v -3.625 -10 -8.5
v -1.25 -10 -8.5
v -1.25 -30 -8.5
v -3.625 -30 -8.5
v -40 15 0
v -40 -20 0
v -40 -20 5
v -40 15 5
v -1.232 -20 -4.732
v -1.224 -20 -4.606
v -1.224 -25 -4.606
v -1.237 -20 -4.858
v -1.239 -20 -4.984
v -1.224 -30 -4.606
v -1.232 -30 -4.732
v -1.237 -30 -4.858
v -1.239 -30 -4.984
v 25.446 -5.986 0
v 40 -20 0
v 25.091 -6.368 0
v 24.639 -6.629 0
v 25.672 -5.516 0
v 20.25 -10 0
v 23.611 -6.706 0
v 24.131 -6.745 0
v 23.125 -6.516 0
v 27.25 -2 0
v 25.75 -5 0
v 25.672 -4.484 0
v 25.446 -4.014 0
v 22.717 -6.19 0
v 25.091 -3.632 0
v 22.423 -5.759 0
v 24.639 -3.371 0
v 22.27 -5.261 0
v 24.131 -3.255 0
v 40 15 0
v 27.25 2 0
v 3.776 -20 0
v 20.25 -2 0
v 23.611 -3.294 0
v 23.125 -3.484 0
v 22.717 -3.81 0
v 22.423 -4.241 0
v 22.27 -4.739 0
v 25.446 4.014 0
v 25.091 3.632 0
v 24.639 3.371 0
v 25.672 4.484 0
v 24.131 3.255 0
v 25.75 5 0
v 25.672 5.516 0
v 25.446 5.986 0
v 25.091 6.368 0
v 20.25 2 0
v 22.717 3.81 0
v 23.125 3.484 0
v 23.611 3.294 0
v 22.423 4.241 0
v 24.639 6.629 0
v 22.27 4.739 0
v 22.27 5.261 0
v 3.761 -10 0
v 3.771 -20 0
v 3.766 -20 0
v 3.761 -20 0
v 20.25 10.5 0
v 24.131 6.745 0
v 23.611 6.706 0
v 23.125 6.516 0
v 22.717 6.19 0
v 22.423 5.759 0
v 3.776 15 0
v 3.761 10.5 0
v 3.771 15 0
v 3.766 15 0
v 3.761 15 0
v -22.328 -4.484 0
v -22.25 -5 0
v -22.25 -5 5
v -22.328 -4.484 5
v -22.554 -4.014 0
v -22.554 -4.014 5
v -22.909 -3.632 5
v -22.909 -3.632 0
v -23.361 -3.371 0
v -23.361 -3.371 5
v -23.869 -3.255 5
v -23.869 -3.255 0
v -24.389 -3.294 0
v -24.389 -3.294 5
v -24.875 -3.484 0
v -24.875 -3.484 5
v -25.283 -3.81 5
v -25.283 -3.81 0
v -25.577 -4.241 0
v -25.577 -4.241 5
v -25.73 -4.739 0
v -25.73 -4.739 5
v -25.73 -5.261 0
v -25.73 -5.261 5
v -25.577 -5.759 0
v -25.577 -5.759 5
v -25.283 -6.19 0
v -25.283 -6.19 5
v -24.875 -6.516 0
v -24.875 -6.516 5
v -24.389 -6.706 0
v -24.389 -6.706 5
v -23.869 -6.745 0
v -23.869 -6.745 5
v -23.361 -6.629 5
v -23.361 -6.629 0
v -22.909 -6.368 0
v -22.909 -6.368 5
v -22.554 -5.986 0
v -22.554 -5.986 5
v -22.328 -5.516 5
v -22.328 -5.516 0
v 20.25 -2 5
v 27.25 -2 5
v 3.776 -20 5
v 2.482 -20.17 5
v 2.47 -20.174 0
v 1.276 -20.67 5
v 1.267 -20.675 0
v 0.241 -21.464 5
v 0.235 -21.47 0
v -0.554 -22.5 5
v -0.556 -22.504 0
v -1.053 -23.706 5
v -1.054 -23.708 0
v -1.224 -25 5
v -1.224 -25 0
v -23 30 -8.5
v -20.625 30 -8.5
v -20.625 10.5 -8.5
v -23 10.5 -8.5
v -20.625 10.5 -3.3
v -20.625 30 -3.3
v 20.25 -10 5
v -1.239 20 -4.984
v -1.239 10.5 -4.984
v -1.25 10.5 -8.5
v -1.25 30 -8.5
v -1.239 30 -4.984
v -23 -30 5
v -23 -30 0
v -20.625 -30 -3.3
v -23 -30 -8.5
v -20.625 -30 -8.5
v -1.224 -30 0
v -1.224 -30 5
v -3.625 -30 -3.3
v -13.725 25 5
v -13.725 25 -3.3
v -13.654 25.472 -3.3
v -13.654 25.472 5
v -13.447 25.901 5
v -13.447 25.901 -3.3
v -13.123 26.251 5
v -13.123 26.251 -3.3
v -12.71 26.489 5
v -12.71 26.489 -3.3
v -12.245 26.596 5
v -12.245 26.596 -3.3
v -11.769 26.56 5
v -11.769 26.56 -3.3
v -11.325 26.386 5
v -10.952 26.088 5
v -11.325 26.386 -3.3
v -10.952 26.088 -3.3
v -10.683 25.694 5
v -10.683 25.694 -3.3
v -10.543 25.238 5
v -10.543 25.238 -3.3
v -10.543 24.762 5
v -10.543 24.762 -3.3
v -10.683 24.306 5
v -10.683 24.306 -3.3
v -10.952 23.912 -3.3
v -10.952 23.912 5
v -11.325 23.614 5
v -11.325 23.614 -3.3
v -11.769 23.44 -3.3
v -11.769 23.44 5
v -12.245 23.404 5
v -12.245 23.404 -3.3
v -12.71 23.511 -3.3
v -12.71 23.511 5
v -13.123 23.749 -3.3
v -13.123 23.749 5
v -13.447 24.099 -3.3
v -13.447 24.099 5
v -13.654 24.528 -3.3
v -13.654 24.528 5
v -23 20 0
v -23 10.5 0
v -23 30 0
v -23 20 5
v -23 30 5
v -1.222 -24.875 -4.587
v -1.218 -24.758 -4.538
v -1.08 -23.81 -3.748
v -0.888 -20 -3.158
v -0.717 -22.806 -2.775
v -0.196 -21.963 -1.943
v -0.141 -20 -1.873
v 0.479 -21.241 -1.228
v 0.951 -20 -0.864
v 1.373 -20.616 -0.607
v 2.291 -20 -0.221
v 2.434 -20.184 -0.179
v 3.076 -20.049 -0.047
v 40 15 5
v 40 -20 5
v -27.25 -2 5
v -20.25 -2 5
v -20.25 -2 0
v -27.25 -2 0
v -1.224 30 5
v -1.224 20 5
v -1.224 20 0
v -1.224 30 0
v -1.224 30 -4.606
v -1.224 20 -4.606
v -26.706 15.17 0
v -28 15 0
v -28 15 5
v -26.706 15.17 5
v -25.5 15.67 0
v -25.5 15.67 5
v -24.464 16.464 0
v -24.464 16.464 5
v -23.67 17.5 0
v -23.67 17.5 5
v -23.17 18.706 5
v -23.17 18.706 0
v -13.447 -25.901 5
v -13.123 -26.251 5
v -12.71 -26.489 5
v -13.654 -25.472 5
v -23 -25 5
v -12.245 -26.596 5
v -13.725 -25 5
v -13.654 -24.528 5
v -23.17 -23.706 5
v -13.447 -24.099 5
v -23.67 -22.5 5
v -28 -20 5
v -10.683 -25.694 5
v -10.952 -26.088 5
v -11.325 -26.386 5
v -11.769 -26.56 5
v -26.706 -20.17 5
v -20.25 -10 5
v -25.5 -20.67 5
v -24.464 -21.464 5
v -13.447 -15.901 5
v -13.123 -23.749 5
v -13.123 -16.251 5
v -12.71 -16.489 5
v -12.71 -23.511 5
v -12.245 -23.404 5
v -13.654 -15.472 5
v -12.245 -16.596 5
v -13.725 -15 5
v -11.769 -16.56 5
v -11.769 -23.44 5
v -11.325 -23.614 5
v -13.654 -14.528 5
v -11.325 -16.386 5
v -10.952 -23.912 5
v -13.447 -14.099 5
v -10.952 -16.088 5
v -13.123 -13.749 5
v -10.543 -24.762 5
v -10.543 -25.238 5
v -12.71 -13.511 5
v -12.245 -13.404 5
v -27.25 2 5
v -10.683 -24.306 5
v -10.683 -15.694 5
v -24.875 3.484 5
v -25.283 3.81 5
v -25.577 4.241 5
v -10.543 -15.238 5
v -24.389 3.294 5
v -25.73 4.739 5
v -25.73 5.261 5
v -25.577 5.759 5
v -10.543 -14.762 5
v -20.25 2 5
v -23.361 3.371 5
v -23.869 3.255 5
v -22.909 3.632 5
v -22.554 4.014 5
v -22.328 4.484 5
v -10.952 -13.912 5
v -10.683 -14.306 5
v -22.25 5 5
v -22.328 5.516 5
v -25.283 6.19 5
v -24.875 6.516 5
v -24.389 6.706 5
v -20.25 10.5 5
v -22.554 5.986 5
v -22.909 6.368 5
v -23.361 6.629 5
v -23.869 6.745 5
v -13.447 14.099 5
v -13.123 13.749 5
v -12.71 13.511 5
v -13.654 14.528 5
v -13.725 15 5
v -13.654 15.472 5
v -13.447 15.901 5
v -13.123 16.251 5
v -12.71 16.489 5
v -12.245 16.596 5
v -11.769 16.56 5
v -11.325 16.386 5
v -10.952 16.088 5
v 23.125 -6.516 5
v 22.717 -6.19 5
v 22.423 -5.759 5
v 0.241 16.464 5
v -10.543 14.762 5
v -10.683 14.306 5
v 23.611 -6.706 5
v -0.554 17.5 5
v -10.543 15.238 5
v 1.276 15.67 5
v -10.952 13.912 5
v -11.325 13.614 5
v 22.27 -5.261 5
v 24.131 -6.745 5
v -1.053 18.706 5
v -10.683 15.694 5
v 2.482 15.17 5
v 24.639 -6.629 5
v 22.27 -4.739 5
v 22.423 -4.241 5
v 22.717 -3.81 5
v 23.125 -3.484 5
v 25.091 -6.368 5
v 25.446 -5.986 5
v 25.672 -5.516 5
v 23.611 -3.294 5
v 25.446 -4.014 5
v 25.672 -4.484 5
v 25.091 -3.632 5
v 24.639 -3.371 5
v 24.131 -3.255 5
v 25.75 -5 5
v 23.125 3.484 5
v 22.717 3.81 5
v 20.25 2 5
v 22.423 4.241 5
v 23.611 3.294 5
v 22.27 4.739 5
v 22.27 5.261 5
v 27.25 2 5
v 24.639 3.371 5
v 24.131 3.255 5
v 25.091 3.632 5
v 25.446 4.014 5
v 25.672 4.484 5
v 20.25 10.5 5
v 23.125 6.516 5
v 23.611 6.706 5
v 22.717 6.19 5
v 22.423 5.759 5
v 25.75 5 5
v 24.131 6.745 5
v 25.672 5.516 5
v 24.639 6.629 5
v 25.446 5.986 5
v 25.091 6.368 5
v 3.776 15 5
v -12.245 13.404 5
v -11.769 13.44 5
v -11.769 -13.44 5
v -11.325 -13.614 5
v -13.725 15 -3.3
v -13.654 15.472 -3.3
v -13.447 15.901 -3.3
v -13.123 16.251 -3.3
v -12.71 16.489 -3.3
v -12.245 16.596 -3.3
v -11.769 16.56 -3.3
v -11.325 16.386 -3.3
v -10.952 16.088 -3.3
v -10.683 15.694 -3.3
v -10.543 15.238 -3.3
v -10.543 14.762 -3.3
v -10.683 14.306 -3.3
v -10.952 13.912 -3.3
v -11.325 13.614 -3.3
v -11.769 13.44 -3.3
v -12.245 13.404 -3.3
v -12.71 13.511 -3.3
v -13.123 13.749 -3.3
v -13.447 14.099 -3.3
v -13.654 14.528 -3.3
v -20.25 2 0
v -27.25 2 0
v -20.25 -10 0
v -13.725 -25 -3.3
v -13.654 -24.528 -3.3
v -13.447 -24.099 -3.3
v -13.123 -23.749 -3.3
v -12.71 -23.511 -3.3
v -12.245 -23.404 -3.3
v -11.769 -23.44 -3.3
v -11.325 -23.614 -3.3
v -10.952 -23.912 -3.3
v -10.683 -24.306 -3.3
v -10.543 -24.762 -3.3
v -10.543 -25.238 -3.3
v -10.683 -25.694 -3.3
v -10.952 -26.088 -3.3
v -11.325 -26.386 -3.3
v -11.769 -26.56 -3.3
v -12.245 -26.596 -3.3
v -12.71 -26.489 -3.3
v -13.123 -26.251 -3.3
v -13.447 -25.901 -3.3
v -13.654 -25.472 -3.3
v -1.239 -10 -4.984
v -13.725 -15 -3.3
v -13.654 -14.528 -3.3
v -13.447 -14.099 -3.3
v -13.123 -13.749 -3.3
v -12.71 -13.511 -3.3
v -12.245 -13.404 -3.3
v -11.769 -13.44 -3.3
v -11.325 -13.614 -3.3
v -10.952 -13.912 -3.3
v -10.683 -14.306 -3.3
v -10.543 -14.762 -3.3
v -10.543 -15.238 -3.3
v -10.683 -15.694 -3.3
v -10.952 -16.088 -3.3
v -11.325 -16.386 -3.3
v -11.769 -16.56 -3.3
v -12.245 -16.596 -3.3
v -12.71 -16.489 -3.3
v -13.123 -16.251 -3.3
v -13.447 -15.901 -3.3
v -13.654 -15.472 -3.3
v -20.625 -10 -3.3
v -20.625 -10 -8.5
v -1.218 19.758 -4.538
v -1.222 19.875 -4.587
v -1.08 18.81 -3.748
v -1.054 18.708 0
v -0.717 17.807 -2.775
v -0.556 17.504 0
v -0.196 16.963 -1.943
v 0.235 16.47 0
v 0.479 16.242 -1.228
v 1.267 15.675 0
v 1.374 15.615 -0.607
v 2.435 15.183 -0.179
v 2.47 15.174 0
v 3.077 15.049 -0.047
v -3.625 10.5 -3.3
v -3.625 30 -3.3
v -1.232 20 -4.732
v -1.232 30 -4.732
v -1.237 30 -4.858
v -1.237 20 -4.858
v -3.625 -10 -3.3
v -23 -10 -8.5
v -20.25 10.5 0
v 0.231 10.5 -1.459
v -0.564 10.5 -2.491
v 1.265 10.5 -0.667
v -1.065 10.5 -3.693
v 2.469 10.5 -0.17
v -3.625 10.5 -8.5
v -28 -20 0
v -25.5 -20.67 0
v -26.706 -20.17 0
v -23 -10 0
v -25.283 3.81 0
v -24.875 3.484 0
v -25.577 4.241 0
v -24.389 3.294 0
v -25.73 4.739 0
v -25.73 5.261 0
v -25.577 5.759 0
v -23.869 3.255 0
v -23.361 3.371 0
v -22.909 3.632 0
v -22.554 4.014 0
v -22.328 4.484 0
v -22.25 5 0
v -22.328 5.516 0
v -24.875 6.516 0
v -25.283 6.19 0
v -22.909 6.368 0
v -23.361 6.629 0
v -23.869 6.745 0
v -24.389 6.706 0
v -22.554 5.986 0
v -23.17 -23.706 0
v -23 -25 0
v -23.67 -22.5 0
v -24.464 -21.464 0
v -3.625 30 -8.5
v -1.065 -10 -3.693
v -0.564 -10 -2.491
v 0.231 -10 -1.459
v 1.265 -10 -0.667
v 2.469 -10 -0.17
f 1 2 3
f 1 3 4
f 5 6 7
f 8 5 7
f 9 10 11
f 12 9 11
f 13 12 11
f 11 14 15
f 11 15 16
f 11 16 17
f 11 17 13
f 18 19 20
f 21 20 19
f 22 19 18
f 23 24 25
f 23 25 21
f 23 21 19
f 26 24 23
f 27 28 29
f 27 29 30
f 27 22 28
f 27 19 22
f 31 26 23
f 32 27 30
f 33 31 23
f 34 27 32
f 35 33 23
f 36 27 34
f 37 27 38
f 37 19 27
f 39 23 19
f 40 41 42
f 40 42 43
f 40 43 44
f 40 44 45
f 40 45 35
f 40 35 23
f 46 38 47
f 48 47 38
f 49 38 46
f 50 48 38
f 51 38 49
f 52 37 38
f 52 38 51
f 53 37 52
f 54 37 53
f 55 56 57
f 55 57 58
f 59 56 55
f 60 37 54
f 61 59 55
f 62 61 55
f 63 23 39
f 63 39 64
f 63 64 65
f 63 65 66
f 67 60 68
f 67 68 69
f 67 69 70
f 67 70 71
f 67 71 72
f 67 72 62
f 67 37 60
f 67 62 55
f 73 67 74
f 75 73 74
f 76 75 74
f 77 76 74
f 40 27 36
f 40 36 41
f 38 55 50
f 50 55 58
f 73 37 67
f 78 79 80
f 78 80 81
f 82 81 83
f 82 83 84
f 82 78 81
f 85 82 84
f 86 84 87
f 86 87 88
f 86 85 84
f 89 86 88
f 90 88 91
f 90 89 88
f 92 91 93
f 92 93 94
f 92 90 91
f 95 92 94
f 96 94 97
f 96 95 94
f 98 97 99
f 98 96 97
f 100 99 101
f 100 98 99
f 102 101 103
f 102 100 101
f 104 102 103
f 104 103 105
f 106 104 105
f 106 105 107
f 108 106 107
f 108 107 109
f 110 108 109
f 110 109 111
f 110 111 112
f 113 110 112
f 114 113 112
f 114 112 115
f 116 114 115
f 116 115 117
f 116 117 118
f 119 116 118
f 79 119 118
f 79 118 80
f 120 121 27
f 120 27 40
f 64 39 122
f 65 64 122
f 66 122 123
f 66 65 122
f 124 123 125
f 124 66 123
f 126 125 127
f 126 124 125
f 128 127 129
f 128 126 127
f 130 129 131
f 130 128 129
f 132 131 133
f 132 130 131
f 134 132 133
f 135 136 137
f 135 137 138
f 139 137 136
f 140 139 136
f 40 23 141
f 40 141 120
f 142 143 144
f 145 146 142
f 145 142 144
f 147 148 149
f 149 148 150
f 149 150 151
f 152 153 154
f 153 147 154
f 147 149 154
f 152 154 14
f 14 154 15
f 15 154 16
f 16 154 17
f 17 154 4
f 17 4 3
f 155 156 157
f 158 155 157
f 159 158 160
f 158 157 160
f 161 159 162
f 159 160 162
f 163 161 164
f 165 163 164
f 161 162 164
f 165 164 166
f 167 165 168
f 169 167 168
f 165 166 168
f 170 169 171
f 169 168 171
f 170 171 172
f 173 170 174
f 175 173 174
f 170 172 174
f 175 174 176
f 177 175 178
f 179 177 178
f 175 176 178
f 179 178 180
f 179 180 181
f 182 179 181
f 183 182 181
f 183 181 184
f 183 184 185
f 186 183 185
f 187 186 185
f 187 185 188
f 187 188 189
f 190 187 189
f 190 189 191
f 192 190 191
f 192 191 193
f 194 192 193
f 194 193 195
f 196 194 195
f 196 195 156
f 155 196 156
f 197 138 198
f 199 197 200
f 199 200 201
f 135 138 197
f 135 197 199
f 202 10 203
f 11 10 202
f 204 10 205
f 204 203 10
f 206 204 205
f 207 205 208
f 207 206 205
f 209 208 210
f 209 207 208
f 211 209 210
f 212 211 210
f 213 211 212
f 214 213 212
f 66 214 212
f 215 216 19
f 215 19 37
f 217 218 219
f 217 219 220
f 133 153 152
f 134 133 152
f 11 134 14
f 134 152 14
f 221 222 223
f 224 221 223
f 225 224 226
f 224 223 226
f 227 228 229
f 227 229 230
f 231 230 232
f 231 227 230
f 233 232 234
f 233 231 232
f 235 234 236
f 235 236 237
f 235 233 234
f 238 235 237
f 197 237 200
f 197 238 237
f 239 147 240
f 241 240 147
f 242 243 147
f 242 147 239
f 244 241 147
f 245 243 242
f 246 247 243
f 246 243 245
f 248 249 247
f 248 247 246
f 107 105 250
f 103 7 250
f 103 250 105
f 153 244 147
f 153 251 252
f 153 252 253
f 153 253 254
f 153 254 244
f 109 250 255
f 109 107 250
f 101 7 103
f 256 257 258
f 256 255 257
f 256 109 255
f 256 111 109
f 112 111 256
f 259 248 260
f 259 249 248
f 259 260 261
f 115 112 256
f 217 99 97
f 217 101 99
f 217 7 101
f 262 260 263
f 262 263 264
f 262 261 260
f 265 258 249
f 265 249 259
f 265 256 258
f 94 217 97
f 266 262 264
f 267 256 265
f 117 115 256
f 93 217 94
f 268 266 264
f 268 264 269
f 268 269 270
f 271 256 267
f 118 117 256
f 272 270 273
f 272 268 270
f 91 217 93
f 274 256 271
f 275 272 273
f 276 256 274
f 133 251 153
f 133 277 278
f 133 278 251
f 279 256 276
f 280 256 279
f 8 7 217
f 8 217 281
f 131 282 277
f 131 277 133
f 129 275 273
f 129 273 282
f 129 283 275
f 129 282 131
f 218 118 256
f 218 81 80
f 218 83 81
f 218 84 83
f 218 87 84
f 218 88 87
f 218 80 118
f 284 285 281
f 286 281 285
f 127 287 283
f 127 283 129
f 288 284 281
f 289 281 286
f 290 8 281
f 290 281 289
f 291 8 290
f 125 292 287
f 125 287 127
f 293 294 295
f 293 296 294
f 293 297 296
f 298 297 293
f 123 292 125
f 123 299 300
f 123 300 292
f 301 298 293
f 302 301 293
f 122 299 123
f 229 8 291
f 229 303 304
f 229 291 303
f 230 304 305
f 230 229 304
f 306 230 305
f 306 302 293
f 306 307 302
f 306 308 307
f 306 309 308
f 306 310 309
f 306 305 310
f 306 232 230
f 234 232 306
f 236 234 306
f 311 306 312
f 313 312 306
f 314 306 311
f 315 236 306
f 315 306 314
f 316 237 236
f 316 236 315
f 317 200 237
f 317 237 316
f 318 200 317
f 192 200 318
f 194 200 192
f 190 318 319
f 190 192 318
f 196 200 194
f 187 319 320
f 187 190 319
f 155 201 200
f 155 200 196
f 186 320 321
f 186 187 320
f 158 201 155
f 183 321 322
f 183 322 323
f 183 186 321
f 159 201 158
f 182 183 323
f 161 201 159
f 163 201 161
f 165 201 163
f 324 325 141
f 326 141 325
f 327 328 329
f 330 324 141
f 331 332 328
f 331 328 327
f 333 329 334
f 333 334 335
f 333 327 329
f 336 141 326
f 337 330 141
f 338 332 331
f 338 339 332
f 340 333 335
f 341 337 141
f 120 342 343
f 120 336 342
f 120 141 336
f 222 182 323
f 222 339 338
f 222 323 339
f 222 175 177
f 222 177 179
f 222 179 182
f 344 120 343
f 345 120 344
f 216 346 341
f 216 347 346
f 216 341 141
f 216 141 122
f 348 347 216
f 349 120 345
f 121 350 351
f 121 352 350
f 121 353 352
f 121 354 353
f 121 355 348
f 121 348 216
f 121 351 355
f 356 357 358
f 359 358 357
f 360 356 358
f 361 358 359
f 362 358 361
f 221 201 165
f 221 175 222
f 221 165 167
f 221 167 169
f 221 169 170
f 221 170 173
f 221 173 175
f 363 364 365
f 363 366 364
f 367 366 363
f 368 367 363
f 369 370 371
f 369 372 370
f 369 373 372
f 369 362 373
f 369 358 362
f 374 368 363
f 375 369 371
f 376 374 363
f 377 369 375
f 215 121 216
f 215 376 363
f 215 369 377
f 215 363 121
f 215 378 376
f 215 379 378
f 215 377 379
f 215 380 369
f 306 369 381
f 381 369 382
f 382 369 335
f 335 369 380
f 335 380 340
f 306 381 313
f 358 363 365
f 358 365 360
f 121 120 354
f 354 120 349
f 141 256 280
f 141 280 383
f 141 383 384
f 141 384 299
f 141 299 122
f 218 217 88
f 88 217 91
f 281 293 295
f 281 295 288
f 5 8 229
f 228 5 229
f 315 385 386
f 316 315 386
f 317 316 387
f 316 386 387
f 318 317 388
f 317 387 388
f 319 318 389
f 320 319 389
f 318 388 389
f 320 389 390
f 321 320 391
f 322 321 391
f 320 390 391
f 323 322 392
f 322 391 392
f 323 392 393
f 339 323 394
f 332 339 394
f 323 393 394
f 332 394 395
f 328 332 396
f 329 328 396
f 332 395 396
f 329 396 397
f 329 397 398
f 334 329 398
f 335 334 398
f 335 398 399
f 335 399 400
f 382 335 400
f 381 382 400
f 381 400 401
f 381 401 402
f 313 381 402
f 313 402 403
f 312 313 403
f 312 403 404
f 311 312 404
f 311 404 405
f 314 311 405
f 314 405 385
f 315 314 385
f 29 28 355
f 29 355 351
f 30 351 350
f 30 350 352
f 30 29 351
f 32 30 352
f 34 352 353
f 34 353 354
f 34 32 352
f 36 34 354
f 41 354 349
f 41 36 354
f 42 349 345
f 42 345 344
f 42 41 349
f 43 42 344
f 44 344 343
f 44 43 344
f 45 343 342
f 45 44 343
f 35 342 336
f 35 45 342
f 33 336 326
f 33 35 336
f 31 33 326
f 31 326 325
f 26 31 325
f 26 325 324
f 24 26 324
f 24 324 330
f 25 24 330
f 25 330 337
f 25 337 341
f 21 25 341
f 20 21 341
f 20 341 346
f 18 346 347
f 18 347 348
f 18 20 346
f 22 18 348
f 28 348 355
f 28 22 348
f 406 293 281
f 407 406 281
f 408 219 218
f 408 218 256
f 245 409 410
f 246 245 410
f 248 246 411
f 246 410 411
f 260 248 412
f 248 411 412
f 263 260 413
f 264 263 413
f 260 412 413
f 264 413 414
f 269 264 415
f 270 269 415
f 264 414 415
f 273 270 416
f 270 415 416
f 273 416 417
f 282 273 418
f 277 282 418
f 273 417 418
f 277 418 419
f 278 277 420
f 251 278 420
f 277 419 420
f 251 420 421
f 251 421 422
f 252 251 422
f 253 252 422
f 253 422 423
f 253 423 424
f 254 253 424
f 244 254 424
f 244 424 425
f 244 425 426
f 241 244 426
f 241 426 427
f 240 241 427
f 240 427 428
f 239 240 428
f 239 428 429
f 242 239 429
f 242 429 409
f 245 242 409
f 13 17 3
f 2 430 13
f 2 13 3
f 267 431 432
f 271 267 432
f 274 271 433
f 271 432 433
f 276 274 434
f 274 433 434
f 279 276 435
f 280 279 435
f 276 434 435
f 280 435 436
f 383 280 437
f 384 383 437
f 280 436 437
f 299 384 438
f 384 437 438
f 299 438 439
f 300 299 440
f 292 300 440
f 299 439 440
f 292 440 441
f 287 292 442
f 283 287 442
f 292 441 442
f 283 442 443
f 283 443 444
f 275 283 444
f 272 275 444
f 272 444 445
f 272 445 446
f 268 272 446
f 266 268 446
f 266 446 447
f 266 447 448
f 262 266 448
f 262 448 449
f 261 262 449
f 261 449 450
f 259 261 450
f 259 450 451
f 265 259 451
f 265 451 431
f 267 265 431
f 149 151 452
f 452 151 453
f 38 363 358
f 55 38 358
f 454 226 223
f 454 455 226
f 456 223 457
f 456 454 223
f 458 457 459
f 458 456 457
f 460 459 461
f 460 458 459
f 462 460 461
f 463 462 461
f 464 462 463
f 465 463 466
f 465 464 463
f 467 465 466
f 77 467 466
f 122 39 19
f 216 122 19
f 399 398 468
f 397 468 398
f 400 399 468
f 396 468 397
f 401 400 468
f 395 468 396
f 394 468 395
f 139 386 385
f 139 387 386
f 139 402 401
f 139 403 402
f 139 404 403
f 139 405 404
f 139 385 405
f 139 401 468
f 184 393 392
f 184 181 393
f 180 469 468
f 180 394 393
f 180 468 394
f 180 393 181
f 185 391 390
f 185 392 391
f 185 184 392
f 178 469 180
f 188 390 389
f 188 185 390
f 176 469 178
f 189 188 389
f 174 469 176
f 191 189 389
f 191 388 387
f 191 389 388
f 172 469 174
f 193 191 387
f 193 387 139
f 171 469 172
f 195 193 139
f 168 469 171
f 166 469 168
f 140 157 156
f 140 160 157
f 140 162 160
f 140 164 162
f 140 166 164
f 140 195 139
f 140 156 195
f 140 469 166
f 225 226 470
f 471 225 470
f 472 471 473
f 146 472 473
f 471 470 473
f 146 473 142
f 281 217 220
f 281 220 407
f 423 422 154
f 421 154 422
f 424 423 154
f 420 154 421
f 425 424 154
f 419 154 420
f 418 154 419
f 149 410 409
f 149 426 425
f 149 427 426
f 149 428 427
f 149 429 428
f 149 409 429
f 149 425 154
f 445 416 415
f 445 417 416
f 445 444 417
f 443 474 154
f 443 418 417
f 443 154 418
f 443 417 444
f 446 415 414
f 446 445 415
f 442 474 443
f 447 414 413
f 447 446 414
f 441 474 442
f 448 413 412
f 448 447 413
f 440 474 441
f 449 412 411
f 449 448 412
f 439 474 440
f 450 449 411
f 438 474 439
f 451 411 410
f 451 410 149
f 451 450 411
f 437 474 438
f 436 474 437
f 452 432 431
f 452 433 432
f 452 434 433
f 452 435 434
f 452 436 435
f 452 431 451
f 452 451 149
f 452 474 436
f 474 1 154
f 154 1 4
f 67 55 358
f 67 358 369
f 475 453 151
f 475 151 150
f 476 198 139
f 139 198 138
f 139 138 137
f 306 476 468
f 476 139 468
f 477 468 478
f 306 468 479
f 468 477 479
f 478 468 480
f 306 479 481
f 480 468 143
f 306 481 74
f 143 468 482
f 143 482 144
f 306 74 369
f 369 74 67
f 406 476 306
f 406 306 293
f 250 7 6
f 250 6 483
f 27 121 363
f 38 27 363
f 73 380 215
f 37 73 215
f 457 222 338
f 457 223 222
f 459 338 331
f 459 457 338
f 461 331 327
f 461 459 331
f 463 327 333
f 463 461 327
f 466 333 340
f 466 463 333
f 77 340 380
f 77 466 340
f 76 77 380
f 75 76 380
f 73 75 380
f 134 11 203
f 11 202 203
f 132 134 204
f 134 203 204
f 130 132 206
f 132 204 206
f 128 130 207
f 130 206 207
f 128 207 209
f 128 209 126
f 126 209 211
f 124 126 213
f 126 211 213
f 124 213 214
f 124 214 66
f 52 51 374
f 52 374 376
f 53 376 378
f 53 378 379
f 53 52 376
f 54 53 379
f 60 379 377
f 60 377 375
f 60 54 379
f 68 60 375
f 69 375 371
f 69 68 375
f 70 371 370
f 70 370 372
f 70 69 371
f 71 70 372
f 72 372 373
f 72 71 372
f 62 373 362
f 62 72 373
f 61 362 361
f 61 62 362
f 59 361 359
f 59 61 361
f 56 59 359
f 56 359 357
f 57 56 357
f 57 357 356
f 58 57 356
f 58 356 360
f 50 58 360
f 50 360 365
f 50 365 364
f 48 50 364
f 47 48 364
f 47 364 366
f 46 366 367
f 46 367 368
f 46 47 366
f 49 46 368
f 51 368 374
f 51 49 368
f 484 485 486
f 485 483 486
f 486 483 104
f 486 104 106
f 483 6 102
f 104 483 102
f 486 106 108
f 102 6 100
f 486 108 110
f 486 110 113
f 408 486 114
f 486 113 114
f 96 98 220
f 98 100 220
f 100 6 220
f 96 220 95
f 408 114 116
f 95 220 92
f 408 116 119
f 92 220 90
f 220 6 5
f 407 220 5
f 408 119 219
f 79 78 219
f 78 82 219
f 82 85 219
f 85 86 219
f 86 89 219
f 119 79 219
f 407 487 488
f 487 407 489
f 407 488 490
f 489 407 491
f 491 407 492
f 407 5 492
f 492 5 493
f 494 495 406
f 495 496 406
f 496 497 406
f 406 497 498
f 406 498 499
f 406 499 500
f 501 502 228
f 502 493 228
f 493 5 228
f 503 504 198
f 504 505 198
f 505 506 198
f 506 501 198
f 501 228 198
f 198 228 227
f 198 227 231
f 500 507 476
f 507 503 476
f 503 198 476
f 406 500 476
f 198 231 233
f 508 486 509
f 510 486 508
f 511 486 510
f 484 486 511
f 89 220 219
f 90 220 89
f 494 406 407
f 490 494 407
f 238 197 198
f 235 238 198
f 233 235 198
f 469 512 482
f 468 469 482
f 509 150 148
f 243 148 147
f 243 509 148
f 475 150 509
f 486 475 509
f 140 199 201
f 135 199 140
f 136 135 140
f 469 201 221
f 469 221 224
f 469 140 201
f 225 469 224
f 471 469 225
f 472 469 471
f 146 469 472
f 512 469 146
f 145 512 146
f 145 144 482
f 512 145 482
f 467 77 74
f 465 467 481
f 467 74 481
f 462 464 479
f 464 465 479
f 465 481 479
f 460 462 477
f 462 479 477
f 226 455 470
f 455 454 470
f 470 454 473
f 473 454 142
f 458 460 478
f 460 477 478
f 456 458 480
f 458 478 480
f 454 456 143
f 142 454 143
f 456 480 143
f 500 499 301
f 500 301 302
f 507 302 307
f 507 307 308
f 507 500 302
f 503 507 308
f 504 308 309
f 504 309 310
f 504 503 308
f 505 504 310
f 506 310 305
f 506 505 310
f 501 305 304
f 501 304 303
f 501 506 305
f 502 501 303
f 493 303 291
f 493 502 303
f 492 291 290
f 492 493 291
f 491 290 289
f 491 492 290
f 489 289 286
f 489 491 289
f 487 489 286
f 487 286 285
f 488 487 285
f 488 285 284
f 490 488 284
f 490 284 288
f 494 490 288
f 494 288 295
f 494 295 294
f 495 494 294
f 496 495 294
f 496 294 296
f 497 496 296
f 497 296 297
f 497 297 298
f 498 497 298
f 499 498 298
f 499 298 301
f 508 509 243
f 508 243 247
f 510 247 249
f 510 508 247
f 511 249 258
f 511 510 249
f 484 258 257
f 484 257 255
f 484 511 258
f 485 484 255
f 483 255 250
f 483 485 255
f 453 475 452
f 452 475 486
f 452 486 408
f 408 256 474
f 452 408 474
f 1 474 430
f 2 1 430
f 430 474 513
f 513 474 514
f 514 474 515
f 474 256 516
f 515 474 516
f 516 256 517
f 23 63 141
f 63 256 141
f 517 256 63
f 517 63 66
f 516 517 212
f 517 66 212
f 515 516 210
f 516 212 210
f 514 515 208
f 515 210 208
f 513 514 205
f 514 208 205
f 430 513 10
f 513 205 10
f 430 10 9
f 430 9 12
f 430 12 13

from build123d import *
from OCP.BRepAlgoAPI import BRepAlgoAPI_Cut
from OCP.TopTools import TopTools_ListOfShape

# Parameters (mm, degrees)
SKETCH_1_R               = 1.75
EXTRUDE_1_DEPTH          = 5
SKETCH_2_W               = 3
SKETCH_2_H               = 10
EXTRUDE_2_DEPTH          = 8.5
SKETCH_3_W               = 15.75
SKETCH_3_H               = 3.3
EXTRUDE_3_DEPTH          = 10
EXTRUDE_4_DEPTH          = 30
SKETCH_6_W               = 21.776428499
SKETCH_6_H               = 20.5
CUT_EXTRUDE_2_DEPTH      = 43.582273307
SKETCH_7_W               = 58
SKETCH_7_H               = 5
EXTRUDE_5_DEPTH          = 5
SKETCH_8_W               = 40.5
SKETCH_8_H               = 0.5
CUT_EXTRUDE_3_DEPTH      = 44.854874301
SKETCH_9_W               = 21.776428499
SKETCH_9_H               = 15
SKETCH_9_H_2             = 10
EXTRUDE_6_DEPTH          = 5
FILLET_1_R               = 5
SKETCH_10_R              = 1.6
CUT_EXTRUDE_4_DEPTH      = 43.542801976
FILLET_START             = 10.5
FILLET_2_DEPTH           = 9.5
FILLET_START_2           = 19.239089818
FILLET_2_2_DEPTH         = 10.760910182
FILLET_START_3           = -4.606326438
FILLET_2_3_DEPTH         = 4.606326438
FILLET_START_4           = -19.9999999
FILLET_3_DEPTH           = 9.9999999
FILLET_START_5           = -30
FILLET_3_2_DEPTH         = 17.8876
FILLET_START_6           = -4.606334035
FILLET_3_3_DEPTH         = 4.606334035
FILLET_START_7           = -25
FILLET_3_4_DEPTH         = 5
FILLET_START_8           = -20.000021607
FILLET_3_5_DEPTH         = 2.1607e-05
SKETCH_11_W              = 11
SKETCH_11_H              = 35
EXTRUDE_7_DEPTH          = 5
SKETCH_12_W              = 10
SKETCH_12_H              = 10
EXTRUDE_8_DEPTH          = 5
SKETCH_14_W              = 0.625
SKETCH_14_H              = 60
CUT_EXTRUDE_5_DEPTH      = 5.2
SKETCH_15_W              = 10
SKETCH_15_H              = 10
CUT_EXTRUDE_6_DEPTH      = 10
CUT_EXTRUDE_7_DEPTH      = 51.717354032
CUT_EXTRUDE_7_DEPTH_BACK = 51.717354032
SKETCH_16_W              = 7
SKETCH_16_H              = 4


with BuildPart() as part:
    # ｽｹｯﾁ1 → ﾎﾞｽ - 押し出し1 (new body)
    with BuildSketch(Plane.XY):
        Polygon((-20.25, 10), (-20.25, -10), (20.25, -10), (20.25, 10), (29, 10), (29, -20), (-29, -20), (-29, 10), align=None)
        with Locations((-24, 5)):
            Circle(SKETCH_1_R, mode=Mode.SUBTRACT)
        with Locations((-24, -5)):
            Circle(SKETCH_1_R, mode=Mode.SUBTRACT)
        with Locations((24, 5)):
            Circle(SKETCH_1_R, mode=Mode.SUBTRACT)
        with Locations((24, -5)):
            Circle(SKETCH_1_R, mode=Mode.SUBTRACT)
    extrude(amount=EXTRUDE_1_DEPTH)

    # ｽｹｯﾁ2 → ﾎﾞｽ - 押し出し2 (add)
    with BuildSketch(Plane(origin=(0, 0, 0), x_dir=(-1, 0, 0), z_dir=(0, 0, -1))):
        with Locations((21.5, -15)):
            Rectangle(SKETCH_2_W, SKETCH_2_H)
        with Locations((2.75, -15)):
            Rectangle(SKETCH_2_W, SKETCH_2_H)
    extrude(amount=EXTRUDE_2_DEPTH)

    # ｽｹｯﾁ3 → ﾎﾞｽ - 押し出し3 (add)
    with BuildSketch(Plane(origin=(0, -10, 0), x_dir=(1, 0, 0), z_dir=(0, 1, 0))):
        with Locations((-12.125, 1.65)):
            Rectangle(SKETCH_3_W, SKETCH_3_H)
    extrude(amount=-EXTRUDE_3_DEPTH)

    # ｽｹｯﾁ4 → ﾎﾞｽ - 押し出し4 (add, symmetric)
    with BuildSketch(Plane(origin=(0, 0, 0), x_dir=(1, 0, 0), z_dir=(0, 1, 0))):
        Polygon((-23, 8.5), (-23, 0), (-1.223571501, 0), (-1.25, 8.5), (-4.25, 8.5), (-4.25, 3.3), (-20, 3.3), (-20, 8.5), align=None)
    extrude(amount=EXTRUDE_4_DEPTH, both=True)

    # ｽｹｯﾁ6 → ｶｯﾄ - 押し出し2 (cut, through all)
    with BuildSketch(Plane.XY):
        with Locations((-12.11178575, 0.25)):
            Rectangle(SKETCH_6_W, SKETCH_6_H)
    extrude(amount=-CUT_EXTRUDE_2_DEPTH, mode=Mode.SUBTRACT)


with BuildPart() as cut_extrude_2_piece_1:
    # of the separate pieces the step leaves, piece 1, a body of its own (cut_extrude_2_pieces)
    add(part.part.solids().sort_by_distance((-20.25, 10, 0))[0])



with BuildPart() as cut_extrude_2_piece_2:
    # of the separate pieces the step leaves, piece 2, a body of its own (cut_extrude_2_pieces)
    add(part.part.solids().sort_by_distance((-23, 10.5, 0))[0])


with BuildPart() as cut_extrude_2_piece_1_1:
    add(cut_extrude_2_piece_1.part)

    add(cut_extrude_2_piece_2.part)  # ﾎﾞｽ - 押し出し5 merges ｶｯﾄ - 押し出し2 piece 2
    # ｽｹｯﾁ7 → ﾎﾞｽ - 押し出し5 (add)
    with BuildSketch(Plane.XY.offset(5)):
        with Locations((0, 12.5)):
            Rectangle(SKETCH_7_W, SKETCH_7_H)
    extrude(amount=-EXTRUDE_5_DEPTH)

    # ｽｹｯﾁ8 → ｶｯﾄ - 押し出し3 (cut, through all)
    with BuildSketch(Plane.XY.offset(5)):
        with Locations((0, 10.25)):
            Rectangle(SKETCH_8_W, SKETCH_8_H)
    extrude(amount=-CUT_EXTRUDE_3_DEPTH, mode=Mode.SUBTRACT)

    # ｽｹｯﾁ9 → ﾎﾞｽ - 押し出し6 (add)
    with BuildSketch(Plane.XY):
        with Locations((-12.11178575, 22.5)):
            Rectangle(SKETCH_9_W, SKETCH_9_H)
        with Locations((-12.11178575, -25)):
            Rectangle(SKETCH_9_W, SKETCH_9_H_2)
    extrude(amount=EXTRUDE_6_DEPTH)

    # ﾌｨﾚｯﾄ1
    # the kernel refuses this fillet: 5 mm, written as the material it adds along each edge
    with BuildSketch(Plane(origin=(-23, 15, 0), x_dir=(-1, 0, 0), z_dir=(0, 0, 1))) as fillet_1_piece_1:
        with BuildLine():
            CenterArc((FILLET_1_R, -FILLET_1_R), FILLET_1_R, 90, 90)
            Line((0, -FILLET_1_R), (0, 0))
            Line((0, 0), (FILLET_1_R, 0))
        make_face()
    extrude(amount=5)
    with BuildSketch(Plane(origin=(-1.223571501, 15, 0), x_dir=(1, 0, 0), z_dir=(0, 0, 1))) as fillet_1_piece_2_section:
        with BuildLine():
            CenterArc((FILLET_1_R, FILLET_1_R), FILLET_1_R, 180, 90)
            Line((0, FILLET_1_R), (0, 0))
            Line((0, 0), (FILLET_1_R, 0))
        make_face()
    fillet_1_piece_2 = extrude(amount=5, mode=Mode.PRIVATE)
    fillet_1_piece_2 = split(fillet_1_piece_2, bisect_by=Plane(origin=(-1.223571501, 15, 0), z_dir=(0.9999951663633728, 0, -0.003109220141828846)), keep=Keep.TOP, mode=Mode.PRIVATE)
    add(fillet_1_piece_2)
    with BuildSketch(Plane(origin=(-1.223571501, 15, 0), x_dir=(1, 0, 0), z_dir=(0, 0, 1))) as fillet_1_piece_3_section:
        with BuildLine():
            CenterArc((FILLET_1_R, FILLET_1_R), FILLET_1_R, 180, 90)
            Line((0, FILLET_1_R), (0, 0))
            Line((0, 0), (FILLET_1_R, 0))
        make_face()
    fillet_1_piece_3 = extrude(amount=5, mode=Mode.PRIVATE)
    fillet_1_piece_3 = split(fillet_1_piece_3, bisect_by=Plane(origin=(-1.223571501, 15, 0), z_dir=(-0.9999951663633728, 0, 0.003109220141828846)), keep=Keep.TOP, mode=Mode.PRIVATE)
    add(fillet_1_piece_3)
    with BuildSketch(Plane(origin=(-1.223571501, -20, 0), x_dir=(1, 0, 0), z_dir=(0, 0, 1))) as fillet_1_piece_4_section:
        with BuildLine():
            CenterArc((FILLET_1_R, -FILLET_1_R), FILLET_1_R, 90, 90)
            Line((0, -FILLET_1_R), (0, 0))
            Line((0, 0), (FILLET_1_R, 0))
        make_face()
    fillet_1_piece_4 = extrude(amount=5, mode=Mode.PRIVATE)
    fillet_1_piece_4 = split(fillet_1_piece_4, bisect_by=Plane(origin=(-1.223571501, -20, 0), z_dir=(0.9999951663633728, 0, -0.003109220141828846)), keep=Keep.TOP, mode=Mode.PRIVATE)
    add(fillet_1_piece_4)
    with BuildSketch(Plane(origin=(-1.223571501, -20, 0), x_dir=(1, 0, 0), z_dir=(0, 0, 1))) as fillet_1_piece_5_section:
        with BuildLine():
            CenterArc((FILLET_1_R, -FILLET_1_R), FILLET_1_R, 90, 90)
            Line((0, -FILLET_1_R), (0, 0))
            Line((0, 0), (FILLET_1_R, 0))
        make_face()
    fillet_1_piece_5 = extrude(amount=5, mode=Mode.PRIVATE)
    fillet_1_piece_5 = split(fillet_1_piece_5, bisect_by=Plane(origin=(-1.223571501, -20, 0), z_dir=(-0.9999951663633728, 0, 0.003109220141828846)), keep=Keep.TOP, mode=Mode.PRIVATE)
    add(fillet_1_piece_5)
    with BuildSketch(Plane(origin=(-23, -20, 0), x_dir=(-1, 0, 0), z_dir=(0, 0, 1))) as fillet_1_piece_6:
        with BuildLine():
            CenterArc((FILLET_1_R, FILLET_1_R), FILLET_1_R, 180, 90)
            Line((0, FILLET_1_R), (0, 0))
            Line((0, 0), (FILLET_1_R, 0))
        make_face()
    extrude(amount=5)

    # ｽｹｯﾁ10 → ｶｯﾄ - 押し出し4 (cut, through all)
    with BuildSketch(Plane(origin=(0, 0, -3.3), x_dir=(-1, 0, 0), z_dir=(0, 0, -1))):
        with Locations((12.125, 25)):
            Circle(SKETCH_10_R)
        with Locations((12.125, 15)):
            Circle(SKETCH_10_R)
        with Locations((12.125, -15)):
            Circle(SKETCH_10_R)
        with Locations((12.125, -25)):
            Circle(SKETCH_10_R)
    extrude(amount=-CUT_EXTRUDE_4_DEPTH, mode=Mode.SUBTRACT)

    # ﾌｨﾚｯﾄ2: read off the stored shape, not the designer's step
    # ﾌｨﾚｯﾄ2 outline → ﾌｨﾚｯﾄ2 (add)
    with BuildSketch(Plane(origin=(0, 0, 0), x_dir=(1, 0, 0), z_dir=(0, 1, 0)).offset(FILLET_START)):
        with BuildLine():
            ThreePointArc((3.760906491, 0), (0.230873241, 1.458973983), (-1.23906934, 4.984453899))
            Line((-1.23906934, 4.984453899), (-1.223571501, 0))
            Line((-1.223571501, 0), (3.760906491, 0))
        make_face()
    extrude(amount=FILLET_2_DEPTH)

    # Fillet 2 2 outline → Fillet 2 2 (add)
    with BuildSketch(Plane(origin=(0, 0, 0), x_dir=(1, 0, 0), z_dir=(0, 1, 0)).offset(FILLET_START_2)):
        with BuildLine():
            Line((-1.223571501, 0), (-1.223571501, 4.606326096))
            ThreePointArc((-1.223571501, 4.606326096), (-1.234899219, 4.795243318), (-1.23906934, 4.984453899))
            Line((-1.23906934, 4.984453899), (-1.223571501, 0))
        make_face()
    extrude(amount=FILLET_2_2_DEPTH)

    # Fillet 2 3 outline → Fillet 2 3 (cut)
    with BuildSketch(Plane.XY.offset(FILLET_START_3)):
        with BuildLine():
            ThreePointArc((-1.223571501, 20), (0.240894593, 16.464466094), (3.776428499, 15))
            Line((3.776428499, 15), (5, 15))
            Line((5, 15), (5, 20))
            Line((5, 20), (-1.223571501, 20))
        make_face()
    extrude(amount=FILLET_2_3_DEPTH, mode=Mode.SUBTRACT)


with BuildPart() as fillet_3_tool:
    # ﾌｨﾚｯﾄ3: read off the stored shape, not the designer's step
    # ﾌｨﾚｯﾄ3 outline → ﾌｨﾚｯﾄ3 (new body)
    with BuildSketch(Plane(origin=(0, 0, 0), x_dir=(1, 0, 0), z_dir=(0, 1, 0)).offset(FILLET_START_4)):
        with BuildLine():
            ThreePointArc((3.760906491, 0), (0.230873241, 1.458973983), (-1.23906934, 4.984453899))
            Line((-1.23906934, 4.984453899), (-1.223571501, 0))
            Line((-1.223571501, 0), (3.760906491, 0))
        make_face()
    extrude(amount=FILLET_3_DEPTH)


with BuildPart() as cut_extrude_2_piece_1_2:
    add(cut_extrude_2_piece_1_1.part)


with BuildPart() as cut_extrude_2_piece_1_3:
    # ﾌｨﾚｯﾄ3: joined with fillet_3_tool
    add(cut_extrude_2_piece_1_2.part.fuse(fillet_3_tool.part, tol=0.00001))


with BuildPart() as fillet_3_2_tool:
    # Fillet 3 2 outline → Fillet 3 2 (new body)
    with BuildSketch(Plane(origin=(0, 0, 0), x_dir=(1, 0, 0), z_dir=(0, 1, 0)).offset(FILLET_START_5)):
        with BuildLine():
            Line((-1.223571501, 0), (-1.223571501, 4.606326096))
            ThreePointArc((-1.223571501, 4.606326096), (-1.234899219, 4.795243318), (-1.23906934, 4.984453899))
            Line((-1.23906934, 4.984453899), (-1.223571501, 0))
        make_face()
    extrude(amount=FILLET_3_2_DEPTH)


with BuildPart() as cut_extrude_2_piece_1_4:
    add(cut_extrude_2_piece_1_3.part)


with BuildPart() as cut_extrude_2_piece_1_5:
    # Fillet 3 2: joined with fillet_3_2_tool
    add(cut_extrude_2_piece_1_4.part.fuse(fillet_3_2_tool.part, tol=0.00001))


with BuildPart() as fillet_3_3_tool:
    # Fillet 3 3 outline → Fillet 3 3 (new body)
    with BuildSketch(Plane.XY.offset(FILLET_START_6)):
        with BuildLine():
            ThreePointArc((-1.223571501, -25), (0.235411013, -21.469958192), (3.760906566, -20.000024093))
            Line((3.760906566, -20.000024093), (-1.223571501, -19.9999999))
            Line((-1.223571501, -19.9999999), (-1.223571501, -25))
        make_face()
    extrude(amount=FILLET_3_3_DEPTH)


with BuildPart() as cut_extrude_2_piece_1_6:
    add(cut_extrude_2_piece_1_5.part)


with BuildPart() as cut_extrude_2_piece_1_7:
    # Fillet 3 3: joined with fillet_3_3_tool
    add(cut_extrude_2_piece_1_6.part.fuse(fillet_3_3_tool.part, tol=0.00001))


with BuildPart() as fillet_3_4_tool:
    # Fillet 3 4 outline → Fillet 3 4 (new body)
    with BuildSketch(Plane(origin=(0, 0, 0), x_dir=(1, 0, 0), z_dir=(0, 1, 0)).offset(FILLET_START_7)):
        with BuildLine():
            ThreePointArc((-1.223571501, 4.606326096), (0.367410471, 1.327918198), (3.760906491, 0))
            Line((3.760906491, 0), (3.760906566, 4.606334035))
            Line((3.760906566, 4.606334035), (-1.223571501, 4.606326096))
        make_face()
    extrude(amount=FILLET_3_4_DEPTH)


with BuildPart() as cut_extrude_2_piece_1_8:
    add(cut_extrude_2_piece_1_7.part)

    # Fillet 3 4: cut by fillet_3_4_tool, with a tolerance
    fillet_3_4_stock = TopTools_ListOfShape()
    fillet_3_4_stock.Append(cut_extrude_2_piece_1_8.part.wrapped)
    fillet_3_4_tools = TopTools_ListOfShape()
    fillet_3_4_tools.Append(fillet_3_4_tool.part.wrapped)
    fillet_3_4_cut = BRepAlgoAPI_Cut()
    fillet_3_4_cut.SetArguments(fillet_3_4_stock)
    fillet_3_4_cut.SetTools(fillet_3_4_tools)
    fillet_3_4_cut.SetFuzzyValue(0.00001)
    fillet_3_4_cut.Build()
    add(Compound.cast(fillet_3_4_cut.Shape()).solids(), mode=Mode.REPLACE)


with BuildPart() as fillet_3_5_tool:
    # Fillet 3 5 outline → Fillet 3 5 (new body)
    with BuildSketch(Plane(origin=(0, 0, 0), x_dir=(1, 0, 0), z_dir=(0, 1, 0)).offset(FILLET_START_8)):
        with BuildLine():
            Line((-1.223571501, 0), (3.760906491, 0))
            ThreePointArc((3.760906491, 0), (0.367410471, 1.327918198), (-1.223571501, 4.606326096))
            Line((-1.223571501, 4.606326096), (-1.223571501, 0))
        make_face()
    extrude(amount=FILLET_3_5_DEPTH)


with BuildPart() as cut_extrude_2_piece_1_9:
    add(cut_extrude_2_piece_1_8.part)


with BuildPart() as cut_extrude_2_piece_1_10:
    # Fillet 3 5: joined with fillet_3_5_tool
    add(cut_extrude_2_piece_1_9.part.fuse(fillet_3_5_tool.part, tol=0.00001))

    # ｽｹｯﾁ11 → ﾎﾞｽ - 押し出し7 (add)
    with BuildSketch(Plane.XY.offset(5)):
        with Locations((-34.5, -2.5)):
            Rectangle(SKETCH_11_W, SKETCH_11_H)
        with Locations((34.5, -2.5)):
            Rectangle(SKETCH_11_W, SKETCH_11_H)
    extrude(amount=-EXTRUDE_7_DEPTH)

    # ｽｹｯﾁ12 → ﾎﾞｽ - 押し出し8 (add)
    with BuildSketch(Plane.XZ.offset(20)):
        with Locations((-35, 10)):
            Rectangle(SKETCH_12_W, SKETCH_12_H)
        with Locations((35, 10)):
            Rectangle(SKETCH_12_W, SKETCH_12_H)
    extrude(amount=-EXTRUDE_8_DEPTH)

    # ｽｹｯﾁ14 → ｶｯﾄ - 押し出し5 (cut)
    with BuildSketch(Plane(origin=(0, 0, -8.5), x_dir=(-1, 0, 0), z_dir=(0, 0, -1))):
        with Locations((20.3125, 0)):
            Rectangle(SKETCH_14_W, SKETCH_14_H)
        Polygon((4.25, 30), (3.625, 30), (3.625, 10.5), (3.625, -30), (4.25, -30), (4.25, 10.5), align=None)
    extrude(amount=-CUT_EXTRUDE_5_DEPTH, mode=Mode.SUBTRACT)

    # ｽｹｯﾁ15 → ｶｯﾄ - 押し出し6 (cut)
    with BuildSketch(Plane(origin=(0, -15, 0), x_dir=(1, 0, 0), z_dir=(0, 1, 0))):
        with Locations((-35, -10)):
            Rectangle(SKETCH_15_W, SKETCH_15_H)
        with Locations((35, -10)):
            Rectangle(SKETCH_15_W, SKETCH_15_H)
    extrude(amount=-CUT_EXTRUDE_6_DEPTH, mode=Mode.SUBTRACT)

    # ｽｹｯﾁ16 → ｶｯﾄ - 押し出し7 (cut, two sides: drawn at the far end of the back side and taken through both)
    with BuildSketch(Plane(origin=(0, 0, 0), x_dir=(-1, 0, 0), z_dir=(0, 0, -1)).offset(-CUT_EXTRUDE_7_DEPTH_BACK)):
        with Locations((23.75, 0)):
            Rectangle(SKETCH_16_W, SKETCH_16_H)
        with Locations((-23.75, 0)):
            Rectangle(SKETCH_16_W, SKETCH_16_H)
    extrude(amount=CUT_EXTRUDE_7_DEPTH + CUT_EXTRUDE_7_DEPTH_BACK, mode=Mode.SUBTRACT)


solid = cut_extrude_2_piece_1_10.part
